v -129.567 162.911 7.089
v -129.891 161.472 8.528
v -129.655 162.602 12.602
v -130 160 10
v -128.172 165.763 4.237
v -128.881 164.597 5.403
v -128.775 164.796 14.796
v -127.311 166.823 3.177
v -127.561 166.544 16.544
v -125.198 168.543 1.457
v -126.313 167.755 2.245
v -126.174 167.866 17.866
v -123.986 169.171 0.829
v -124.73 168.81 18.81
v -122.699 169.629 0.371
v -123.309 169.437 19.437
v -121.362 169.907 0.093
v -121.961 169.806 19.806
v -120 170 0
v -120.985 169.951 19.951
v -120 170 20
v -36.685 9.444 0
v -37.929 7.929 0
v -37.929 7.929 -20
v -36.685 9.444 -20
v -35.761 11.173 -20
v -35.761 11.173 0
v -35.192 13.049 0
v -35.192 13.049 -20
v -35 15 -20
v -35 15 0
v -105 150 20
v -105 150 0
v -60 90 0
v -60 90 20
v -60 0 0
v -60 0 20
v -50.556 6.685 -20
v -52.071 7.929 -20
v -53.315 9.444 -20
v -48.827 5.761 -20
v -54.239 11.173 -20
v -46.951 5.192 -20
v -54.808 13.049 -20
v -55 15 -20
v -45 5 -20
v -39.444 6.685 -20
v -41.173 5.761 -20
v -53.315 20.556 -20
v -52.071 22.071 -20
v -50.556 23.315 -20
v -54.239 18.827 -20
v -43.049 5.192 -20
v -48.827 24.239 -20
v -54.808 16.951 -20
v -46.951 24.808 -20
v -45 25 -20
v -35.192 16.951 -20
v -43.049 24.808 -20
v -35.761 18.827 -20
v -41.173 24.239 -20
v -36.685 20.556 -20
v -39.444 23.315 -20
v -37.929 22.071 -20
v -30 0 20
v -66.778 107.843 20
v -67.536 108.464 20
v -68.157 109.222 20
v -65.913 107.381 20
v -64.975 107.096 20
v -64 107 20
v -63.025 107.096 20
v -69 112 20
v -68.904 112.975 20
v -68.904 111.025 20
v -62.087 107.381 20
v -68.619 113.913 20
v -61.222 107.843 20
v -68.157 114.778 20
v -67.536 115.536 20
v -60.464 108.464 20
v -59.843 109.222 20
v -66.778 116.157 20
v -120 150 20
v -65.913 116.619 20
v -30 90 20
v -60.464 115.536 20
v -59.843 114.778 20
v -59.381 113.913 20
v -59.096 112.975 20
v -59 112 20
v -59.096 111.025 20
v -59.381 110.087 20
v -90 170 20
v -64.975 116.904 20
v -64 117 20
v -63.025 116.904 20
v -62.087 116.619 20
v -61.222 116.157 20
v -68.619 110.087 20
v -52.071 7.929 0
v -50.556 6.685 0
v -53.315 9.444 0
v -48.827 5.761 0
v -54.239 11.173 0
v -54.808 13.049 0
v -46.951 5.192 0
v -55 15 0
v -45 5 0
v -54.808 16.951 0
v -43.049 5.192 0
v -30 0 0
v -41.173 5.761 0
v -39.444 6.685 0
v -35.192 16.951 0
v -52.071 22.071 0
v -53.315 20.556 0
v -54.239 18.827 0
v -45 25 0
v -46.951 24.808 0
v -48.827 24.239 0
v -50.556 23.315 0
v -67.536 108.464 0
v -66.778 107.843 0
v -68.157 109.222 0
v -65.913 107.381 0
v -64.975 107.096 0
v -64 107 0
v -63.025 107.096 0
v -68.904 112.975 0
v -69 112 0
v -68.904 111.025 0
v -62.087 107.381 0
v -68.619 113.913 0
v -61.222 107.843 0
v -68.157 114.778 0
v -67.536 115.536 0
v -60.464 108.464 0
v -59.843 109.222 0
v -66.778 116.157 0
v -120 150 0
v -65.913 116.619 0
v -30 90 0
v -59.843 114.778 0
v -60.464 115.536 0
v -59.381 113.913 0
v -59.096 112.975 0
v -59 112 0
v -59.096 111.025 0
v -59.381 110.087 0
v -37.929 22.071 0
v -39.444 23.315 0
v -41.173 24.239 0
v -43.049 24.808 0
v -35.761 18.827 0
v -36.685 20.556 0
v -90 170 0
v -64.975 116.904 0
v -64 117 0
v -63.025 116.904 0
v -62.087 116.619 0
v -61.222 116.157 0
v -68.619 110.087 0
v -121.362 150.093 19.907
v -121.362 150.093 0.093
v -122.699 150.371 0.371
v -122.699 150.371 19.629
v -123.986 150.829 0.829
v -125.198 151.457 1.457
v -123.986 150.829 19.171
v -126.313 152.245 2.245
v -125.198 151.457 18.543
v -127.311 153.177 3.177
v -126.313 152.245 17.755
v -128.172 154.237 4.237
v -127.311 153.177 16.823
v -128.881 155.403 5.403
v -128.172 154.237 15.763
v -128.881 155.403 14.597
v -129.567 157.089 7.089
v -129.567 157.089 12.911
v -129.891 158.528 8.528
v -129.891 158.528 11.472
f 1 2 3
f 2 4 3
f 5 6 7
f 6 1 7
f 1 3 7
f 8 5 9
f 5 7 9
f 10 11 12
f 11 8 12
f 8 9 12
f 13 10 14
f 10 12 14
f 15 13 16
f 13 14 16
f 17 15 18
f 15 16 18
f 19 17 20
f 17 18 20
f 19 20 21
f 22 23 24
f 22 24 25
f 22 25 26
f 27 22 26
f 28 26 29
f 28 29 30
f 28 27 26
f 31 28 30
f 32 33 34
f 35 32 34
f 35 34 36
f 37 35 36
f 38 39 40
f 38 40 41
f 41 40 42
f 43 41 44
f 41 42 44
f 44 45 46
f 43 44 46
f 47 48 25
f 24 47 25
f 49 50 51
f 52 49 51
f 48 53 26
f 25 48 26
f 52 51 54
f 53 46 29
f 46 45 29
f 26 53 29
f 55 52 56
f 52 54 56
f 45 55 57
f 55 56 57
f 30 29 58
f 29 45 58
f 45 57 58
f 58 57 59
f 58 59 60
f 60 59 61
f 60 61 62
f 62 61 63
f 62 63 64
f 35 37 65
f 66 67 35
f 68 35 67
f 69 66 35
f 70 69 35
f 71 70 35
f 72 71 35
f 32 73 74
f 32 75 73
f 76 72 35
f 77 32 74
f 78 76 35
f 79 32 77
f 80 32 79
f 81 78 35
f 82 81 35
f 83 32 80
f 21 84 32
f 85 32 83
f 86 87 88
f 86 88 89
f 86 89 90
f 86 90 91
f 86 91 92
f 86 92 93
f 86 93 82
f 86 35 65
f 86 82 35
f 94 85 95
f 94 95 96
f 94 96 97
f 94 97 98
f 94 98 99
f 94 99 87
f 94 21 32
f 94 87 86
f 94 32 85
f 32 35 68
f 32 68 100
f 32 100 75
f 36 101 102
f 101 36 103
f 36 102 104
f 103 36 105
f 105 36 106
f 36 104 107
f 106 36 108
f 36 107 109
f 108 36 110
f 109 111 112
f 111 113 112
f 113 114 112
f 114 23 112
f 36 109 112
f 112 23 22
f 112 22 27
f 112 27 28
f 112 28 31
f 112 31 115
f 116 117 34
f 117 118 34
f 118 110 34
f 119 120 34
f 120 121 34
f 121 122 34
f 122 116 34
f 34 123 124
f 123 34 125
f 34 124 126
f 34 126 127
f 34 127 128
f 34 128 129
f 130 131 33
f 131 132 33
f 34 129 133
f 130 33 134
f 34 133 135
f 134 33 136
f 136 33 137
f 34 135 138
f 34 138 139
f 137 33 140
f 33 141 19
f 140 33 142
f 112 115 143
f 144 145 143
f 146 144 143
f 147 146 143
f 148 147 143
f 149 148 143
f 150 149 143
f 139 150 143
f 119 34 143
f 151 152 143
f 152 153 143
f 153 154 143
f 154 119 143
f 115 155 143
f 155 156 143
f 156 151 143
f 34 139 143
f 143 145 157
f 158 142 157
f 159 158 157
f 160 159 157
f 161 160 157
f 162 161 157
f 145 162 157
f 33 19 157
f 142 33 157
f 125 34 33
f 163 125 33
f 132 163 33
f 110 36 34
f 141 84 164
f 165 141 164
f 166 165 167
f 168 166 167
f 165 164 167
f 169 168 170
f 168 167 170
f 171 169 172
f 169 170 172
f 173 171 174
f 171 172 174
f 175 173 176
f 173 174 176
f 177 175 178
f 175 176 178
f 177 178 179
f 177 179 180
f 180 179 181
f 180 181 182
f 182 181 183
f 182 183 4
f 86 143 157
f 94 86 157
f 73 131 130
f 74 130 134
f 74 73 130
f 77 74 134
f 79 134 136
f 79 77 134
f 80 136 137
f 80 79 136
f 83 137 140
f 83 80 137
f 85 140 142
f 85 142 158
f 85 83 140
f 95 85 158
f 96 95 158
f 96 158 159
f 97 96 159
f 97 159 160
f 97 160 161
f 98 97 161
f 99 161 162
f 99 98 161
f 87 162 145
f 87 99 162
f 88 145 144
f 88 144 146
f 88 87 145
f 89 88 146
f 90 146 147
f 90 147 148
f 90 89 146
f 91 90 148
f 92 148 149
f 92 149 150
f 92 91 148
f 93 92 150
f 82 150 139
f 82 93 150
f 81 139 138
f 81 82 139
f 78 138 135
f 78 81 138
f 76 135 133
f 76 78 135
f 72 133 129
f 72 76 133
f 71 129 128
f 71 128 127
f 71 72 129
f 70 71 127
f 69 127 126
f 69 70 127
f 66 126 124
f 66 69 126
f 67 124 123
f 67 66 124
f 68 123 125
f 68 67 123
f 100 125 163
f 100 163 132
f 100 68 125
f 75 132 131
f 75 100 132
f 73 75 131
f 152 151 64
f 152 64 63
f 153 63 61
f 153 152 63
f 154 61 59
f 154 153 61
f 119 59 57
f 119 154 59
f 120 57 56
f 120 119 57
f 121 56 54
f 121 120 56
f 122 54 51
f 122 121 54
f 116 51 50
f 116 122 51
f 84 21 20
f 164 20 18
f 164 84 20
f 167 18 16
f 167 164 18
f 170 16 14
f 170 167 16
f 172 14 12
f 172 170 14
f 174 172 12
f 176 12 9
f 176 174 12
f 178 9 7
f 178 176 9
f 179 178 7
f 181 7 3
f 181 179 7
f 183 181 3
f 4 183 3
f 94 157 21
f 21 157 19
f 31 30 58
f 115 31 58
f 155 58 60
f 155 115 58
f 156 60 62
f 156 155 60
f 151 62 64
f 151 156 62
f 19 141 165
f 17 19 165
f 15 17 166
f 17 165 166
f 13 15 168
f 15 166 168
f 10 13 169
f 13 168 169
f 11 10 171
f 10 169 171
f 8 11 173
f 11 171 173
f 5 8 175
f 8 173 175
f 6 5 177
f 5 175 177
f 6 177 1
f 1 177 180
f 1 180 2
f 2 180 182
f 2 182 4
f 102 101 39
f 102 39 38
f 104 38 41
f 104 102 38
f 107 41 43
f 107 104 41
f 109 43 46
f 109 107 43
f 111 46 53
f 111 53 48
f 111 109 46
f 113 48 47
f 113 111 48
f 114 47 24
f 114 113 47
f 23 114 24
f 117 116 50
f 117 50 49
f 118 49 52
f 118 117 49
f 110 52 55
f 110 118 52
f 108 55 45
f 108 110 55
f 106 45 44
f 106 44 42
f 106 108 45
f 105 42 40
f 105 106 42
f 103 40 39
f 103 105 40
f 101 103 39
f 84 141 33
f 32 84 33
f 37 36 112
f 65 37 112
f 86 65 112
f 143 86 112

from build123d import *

# Parameters (mm, degrees)
EXTRUDE_1_DEPTH        = 20
FILLET_2_R             = 10
EXTRUDE_2_DEPTH        = 20
SKETCH_6_R             = 5
CUT_EXTRUDE_1_DEPTH    = 20
FILLET_2_OF_MIRROR_3_R = 10
SKETCH_8_W             = 30
SKETCH_8_H             = 20
CUT_EXTRUDE_2_DEPTH    = 215.941852602


with BuildPart() as part:
    # 草图4 → 凸台-拉伸1 (new body)
    with BuildSketch(Plane.XY):
        Polygon((0, 0), (-30, 0), (-30, 90), (30, 170), (70, 170), (70, 150), (45, 150), (0, 90), align=None)
    extrude_1 = extrude(amount=EXTRUDE_1_DEPTH)

    # 圆角2
    fillet_2_edges = [part.edges().sort_by_distance(p)[0] for p in [
        (70, 160, 0),
        (70, 170, 10),
        (70, 150, 10),
        (70, 160, 20),
    ]]
    fillet(fillet_2_edges, radius=FILLET_2_R - 0.0001)  # a hair under: the kernel refuses the full size

    # 草图5 → 凸台-拉伸2 (add)
    with BuildSketch(Plane(origin=(0, 0, 0), x_dir=(-1, 0, 0), z_dir=(0, 0, -1))):
        with BuildLine():
            ThreePointArc((7.928932188, 22.071067812), (5, 15), (7.928932188, 7.928932188))
            Line((7.928932188, 7.928932188), (15, 15))
            Line((15, 15), (7.928932188, 22.071067812))
        make_face()
        with BuildLine():
            Line((15, 15), (7.928932188, 7.928932188))
            ThreePointArc((7.928932188, 7.928932188), (15, 5), (22.071067812, 7.928932188))
            Line((22.071067812, 7.928932188), (15, 15))
        make_face()
        with BuildLine():
            Line((15, 15), (22.071067812, 7.928932188))
            ThreePointArc((22.071067812, 7.928932188), (24.238795325, 11.173165676), (25, 15))
            ThreePointArc((25, 15), (24.238795325, 18.826834324), (22.071067812, 22.071067812))
            Line((22.071067812, 22.071067812), (15, 15))
        make_face()
        with BuildLine():
            ThreePointArc((22.071067812, 22.071067812), (15, 25), (7.928932188, 22.071067812))
            Line((7.928932188, 22.071067812), (15, 15))
            Line((15, 15), (22.071067812, 22.071067812))
        make_face()
    extrude_2 = extrude(amount=EXTRUDE_2_DEPTH)

    # 草图6 → 切除-拉伸1 (cut)
    with BuildSketch(Plane.XY.offset(20)):
        with Locations((4, 112)):
            Circle(SKETCH_6_R)
    cut_extrude_1 = extrude(amount=-CUT_EXTRUDE_1_DEPTH, mode=Mode.SUBTRACT)

    # 镜向3: 凸台-拉伸1, 凸台-拉伸2, 切除-拉伸1 across plane
    add(extrude_1.mirror(Plane(origin=(-30, 0, 20), x_dir=(0, 0, 1), z_dir=(1, 0, 0))))
    add(extrude_2.mirror(Plane(origin=(-30, 0, 20), x_dir=(0, 0, 1), z_dir=(1, 0, 0))))
    add(cut_extrude_1.mirror(Plane(origin=(-30, 0, 20), x_dir=(0, 0, 1), z_dir=(1, 0, 0))), mode=Mode.SUBTRACT)

    # 圆角2 of 镜向3
    fillet_2_of_mirror_3_edges = [part.edges().sort_by_distance(p)[0] for p in [
        (-130, 160, 0),
        (-130, 170, 10),
        (-130, 150, 10),
        (-130, 160, 20),
    ]]
    fillet(fillet_2_of_mirror_3_edges, radius=FILLET_2_OF_MIRROR_3_R - 0.0001)  # a hair under: the kernel refuses the full size

    # 草图8 → 切除-拉伸2 (cut, through all)
    with BuildSketch(Plane.XZ):
        Polygon((88.976151269, 20), (0, 20), (0, 0), (-30, 0), (-30, -22.976425092), (88.976151269, -22.976425092), align=None)
        with Locations((-15, 10)):
            Rectangle(SKETCH_8_W, SKETCH_8_H)
    extrude(amount=-CUT_EXTRUDE_2_DEPTH, mode=Mode.SUBTRACT)


solid = part.part
